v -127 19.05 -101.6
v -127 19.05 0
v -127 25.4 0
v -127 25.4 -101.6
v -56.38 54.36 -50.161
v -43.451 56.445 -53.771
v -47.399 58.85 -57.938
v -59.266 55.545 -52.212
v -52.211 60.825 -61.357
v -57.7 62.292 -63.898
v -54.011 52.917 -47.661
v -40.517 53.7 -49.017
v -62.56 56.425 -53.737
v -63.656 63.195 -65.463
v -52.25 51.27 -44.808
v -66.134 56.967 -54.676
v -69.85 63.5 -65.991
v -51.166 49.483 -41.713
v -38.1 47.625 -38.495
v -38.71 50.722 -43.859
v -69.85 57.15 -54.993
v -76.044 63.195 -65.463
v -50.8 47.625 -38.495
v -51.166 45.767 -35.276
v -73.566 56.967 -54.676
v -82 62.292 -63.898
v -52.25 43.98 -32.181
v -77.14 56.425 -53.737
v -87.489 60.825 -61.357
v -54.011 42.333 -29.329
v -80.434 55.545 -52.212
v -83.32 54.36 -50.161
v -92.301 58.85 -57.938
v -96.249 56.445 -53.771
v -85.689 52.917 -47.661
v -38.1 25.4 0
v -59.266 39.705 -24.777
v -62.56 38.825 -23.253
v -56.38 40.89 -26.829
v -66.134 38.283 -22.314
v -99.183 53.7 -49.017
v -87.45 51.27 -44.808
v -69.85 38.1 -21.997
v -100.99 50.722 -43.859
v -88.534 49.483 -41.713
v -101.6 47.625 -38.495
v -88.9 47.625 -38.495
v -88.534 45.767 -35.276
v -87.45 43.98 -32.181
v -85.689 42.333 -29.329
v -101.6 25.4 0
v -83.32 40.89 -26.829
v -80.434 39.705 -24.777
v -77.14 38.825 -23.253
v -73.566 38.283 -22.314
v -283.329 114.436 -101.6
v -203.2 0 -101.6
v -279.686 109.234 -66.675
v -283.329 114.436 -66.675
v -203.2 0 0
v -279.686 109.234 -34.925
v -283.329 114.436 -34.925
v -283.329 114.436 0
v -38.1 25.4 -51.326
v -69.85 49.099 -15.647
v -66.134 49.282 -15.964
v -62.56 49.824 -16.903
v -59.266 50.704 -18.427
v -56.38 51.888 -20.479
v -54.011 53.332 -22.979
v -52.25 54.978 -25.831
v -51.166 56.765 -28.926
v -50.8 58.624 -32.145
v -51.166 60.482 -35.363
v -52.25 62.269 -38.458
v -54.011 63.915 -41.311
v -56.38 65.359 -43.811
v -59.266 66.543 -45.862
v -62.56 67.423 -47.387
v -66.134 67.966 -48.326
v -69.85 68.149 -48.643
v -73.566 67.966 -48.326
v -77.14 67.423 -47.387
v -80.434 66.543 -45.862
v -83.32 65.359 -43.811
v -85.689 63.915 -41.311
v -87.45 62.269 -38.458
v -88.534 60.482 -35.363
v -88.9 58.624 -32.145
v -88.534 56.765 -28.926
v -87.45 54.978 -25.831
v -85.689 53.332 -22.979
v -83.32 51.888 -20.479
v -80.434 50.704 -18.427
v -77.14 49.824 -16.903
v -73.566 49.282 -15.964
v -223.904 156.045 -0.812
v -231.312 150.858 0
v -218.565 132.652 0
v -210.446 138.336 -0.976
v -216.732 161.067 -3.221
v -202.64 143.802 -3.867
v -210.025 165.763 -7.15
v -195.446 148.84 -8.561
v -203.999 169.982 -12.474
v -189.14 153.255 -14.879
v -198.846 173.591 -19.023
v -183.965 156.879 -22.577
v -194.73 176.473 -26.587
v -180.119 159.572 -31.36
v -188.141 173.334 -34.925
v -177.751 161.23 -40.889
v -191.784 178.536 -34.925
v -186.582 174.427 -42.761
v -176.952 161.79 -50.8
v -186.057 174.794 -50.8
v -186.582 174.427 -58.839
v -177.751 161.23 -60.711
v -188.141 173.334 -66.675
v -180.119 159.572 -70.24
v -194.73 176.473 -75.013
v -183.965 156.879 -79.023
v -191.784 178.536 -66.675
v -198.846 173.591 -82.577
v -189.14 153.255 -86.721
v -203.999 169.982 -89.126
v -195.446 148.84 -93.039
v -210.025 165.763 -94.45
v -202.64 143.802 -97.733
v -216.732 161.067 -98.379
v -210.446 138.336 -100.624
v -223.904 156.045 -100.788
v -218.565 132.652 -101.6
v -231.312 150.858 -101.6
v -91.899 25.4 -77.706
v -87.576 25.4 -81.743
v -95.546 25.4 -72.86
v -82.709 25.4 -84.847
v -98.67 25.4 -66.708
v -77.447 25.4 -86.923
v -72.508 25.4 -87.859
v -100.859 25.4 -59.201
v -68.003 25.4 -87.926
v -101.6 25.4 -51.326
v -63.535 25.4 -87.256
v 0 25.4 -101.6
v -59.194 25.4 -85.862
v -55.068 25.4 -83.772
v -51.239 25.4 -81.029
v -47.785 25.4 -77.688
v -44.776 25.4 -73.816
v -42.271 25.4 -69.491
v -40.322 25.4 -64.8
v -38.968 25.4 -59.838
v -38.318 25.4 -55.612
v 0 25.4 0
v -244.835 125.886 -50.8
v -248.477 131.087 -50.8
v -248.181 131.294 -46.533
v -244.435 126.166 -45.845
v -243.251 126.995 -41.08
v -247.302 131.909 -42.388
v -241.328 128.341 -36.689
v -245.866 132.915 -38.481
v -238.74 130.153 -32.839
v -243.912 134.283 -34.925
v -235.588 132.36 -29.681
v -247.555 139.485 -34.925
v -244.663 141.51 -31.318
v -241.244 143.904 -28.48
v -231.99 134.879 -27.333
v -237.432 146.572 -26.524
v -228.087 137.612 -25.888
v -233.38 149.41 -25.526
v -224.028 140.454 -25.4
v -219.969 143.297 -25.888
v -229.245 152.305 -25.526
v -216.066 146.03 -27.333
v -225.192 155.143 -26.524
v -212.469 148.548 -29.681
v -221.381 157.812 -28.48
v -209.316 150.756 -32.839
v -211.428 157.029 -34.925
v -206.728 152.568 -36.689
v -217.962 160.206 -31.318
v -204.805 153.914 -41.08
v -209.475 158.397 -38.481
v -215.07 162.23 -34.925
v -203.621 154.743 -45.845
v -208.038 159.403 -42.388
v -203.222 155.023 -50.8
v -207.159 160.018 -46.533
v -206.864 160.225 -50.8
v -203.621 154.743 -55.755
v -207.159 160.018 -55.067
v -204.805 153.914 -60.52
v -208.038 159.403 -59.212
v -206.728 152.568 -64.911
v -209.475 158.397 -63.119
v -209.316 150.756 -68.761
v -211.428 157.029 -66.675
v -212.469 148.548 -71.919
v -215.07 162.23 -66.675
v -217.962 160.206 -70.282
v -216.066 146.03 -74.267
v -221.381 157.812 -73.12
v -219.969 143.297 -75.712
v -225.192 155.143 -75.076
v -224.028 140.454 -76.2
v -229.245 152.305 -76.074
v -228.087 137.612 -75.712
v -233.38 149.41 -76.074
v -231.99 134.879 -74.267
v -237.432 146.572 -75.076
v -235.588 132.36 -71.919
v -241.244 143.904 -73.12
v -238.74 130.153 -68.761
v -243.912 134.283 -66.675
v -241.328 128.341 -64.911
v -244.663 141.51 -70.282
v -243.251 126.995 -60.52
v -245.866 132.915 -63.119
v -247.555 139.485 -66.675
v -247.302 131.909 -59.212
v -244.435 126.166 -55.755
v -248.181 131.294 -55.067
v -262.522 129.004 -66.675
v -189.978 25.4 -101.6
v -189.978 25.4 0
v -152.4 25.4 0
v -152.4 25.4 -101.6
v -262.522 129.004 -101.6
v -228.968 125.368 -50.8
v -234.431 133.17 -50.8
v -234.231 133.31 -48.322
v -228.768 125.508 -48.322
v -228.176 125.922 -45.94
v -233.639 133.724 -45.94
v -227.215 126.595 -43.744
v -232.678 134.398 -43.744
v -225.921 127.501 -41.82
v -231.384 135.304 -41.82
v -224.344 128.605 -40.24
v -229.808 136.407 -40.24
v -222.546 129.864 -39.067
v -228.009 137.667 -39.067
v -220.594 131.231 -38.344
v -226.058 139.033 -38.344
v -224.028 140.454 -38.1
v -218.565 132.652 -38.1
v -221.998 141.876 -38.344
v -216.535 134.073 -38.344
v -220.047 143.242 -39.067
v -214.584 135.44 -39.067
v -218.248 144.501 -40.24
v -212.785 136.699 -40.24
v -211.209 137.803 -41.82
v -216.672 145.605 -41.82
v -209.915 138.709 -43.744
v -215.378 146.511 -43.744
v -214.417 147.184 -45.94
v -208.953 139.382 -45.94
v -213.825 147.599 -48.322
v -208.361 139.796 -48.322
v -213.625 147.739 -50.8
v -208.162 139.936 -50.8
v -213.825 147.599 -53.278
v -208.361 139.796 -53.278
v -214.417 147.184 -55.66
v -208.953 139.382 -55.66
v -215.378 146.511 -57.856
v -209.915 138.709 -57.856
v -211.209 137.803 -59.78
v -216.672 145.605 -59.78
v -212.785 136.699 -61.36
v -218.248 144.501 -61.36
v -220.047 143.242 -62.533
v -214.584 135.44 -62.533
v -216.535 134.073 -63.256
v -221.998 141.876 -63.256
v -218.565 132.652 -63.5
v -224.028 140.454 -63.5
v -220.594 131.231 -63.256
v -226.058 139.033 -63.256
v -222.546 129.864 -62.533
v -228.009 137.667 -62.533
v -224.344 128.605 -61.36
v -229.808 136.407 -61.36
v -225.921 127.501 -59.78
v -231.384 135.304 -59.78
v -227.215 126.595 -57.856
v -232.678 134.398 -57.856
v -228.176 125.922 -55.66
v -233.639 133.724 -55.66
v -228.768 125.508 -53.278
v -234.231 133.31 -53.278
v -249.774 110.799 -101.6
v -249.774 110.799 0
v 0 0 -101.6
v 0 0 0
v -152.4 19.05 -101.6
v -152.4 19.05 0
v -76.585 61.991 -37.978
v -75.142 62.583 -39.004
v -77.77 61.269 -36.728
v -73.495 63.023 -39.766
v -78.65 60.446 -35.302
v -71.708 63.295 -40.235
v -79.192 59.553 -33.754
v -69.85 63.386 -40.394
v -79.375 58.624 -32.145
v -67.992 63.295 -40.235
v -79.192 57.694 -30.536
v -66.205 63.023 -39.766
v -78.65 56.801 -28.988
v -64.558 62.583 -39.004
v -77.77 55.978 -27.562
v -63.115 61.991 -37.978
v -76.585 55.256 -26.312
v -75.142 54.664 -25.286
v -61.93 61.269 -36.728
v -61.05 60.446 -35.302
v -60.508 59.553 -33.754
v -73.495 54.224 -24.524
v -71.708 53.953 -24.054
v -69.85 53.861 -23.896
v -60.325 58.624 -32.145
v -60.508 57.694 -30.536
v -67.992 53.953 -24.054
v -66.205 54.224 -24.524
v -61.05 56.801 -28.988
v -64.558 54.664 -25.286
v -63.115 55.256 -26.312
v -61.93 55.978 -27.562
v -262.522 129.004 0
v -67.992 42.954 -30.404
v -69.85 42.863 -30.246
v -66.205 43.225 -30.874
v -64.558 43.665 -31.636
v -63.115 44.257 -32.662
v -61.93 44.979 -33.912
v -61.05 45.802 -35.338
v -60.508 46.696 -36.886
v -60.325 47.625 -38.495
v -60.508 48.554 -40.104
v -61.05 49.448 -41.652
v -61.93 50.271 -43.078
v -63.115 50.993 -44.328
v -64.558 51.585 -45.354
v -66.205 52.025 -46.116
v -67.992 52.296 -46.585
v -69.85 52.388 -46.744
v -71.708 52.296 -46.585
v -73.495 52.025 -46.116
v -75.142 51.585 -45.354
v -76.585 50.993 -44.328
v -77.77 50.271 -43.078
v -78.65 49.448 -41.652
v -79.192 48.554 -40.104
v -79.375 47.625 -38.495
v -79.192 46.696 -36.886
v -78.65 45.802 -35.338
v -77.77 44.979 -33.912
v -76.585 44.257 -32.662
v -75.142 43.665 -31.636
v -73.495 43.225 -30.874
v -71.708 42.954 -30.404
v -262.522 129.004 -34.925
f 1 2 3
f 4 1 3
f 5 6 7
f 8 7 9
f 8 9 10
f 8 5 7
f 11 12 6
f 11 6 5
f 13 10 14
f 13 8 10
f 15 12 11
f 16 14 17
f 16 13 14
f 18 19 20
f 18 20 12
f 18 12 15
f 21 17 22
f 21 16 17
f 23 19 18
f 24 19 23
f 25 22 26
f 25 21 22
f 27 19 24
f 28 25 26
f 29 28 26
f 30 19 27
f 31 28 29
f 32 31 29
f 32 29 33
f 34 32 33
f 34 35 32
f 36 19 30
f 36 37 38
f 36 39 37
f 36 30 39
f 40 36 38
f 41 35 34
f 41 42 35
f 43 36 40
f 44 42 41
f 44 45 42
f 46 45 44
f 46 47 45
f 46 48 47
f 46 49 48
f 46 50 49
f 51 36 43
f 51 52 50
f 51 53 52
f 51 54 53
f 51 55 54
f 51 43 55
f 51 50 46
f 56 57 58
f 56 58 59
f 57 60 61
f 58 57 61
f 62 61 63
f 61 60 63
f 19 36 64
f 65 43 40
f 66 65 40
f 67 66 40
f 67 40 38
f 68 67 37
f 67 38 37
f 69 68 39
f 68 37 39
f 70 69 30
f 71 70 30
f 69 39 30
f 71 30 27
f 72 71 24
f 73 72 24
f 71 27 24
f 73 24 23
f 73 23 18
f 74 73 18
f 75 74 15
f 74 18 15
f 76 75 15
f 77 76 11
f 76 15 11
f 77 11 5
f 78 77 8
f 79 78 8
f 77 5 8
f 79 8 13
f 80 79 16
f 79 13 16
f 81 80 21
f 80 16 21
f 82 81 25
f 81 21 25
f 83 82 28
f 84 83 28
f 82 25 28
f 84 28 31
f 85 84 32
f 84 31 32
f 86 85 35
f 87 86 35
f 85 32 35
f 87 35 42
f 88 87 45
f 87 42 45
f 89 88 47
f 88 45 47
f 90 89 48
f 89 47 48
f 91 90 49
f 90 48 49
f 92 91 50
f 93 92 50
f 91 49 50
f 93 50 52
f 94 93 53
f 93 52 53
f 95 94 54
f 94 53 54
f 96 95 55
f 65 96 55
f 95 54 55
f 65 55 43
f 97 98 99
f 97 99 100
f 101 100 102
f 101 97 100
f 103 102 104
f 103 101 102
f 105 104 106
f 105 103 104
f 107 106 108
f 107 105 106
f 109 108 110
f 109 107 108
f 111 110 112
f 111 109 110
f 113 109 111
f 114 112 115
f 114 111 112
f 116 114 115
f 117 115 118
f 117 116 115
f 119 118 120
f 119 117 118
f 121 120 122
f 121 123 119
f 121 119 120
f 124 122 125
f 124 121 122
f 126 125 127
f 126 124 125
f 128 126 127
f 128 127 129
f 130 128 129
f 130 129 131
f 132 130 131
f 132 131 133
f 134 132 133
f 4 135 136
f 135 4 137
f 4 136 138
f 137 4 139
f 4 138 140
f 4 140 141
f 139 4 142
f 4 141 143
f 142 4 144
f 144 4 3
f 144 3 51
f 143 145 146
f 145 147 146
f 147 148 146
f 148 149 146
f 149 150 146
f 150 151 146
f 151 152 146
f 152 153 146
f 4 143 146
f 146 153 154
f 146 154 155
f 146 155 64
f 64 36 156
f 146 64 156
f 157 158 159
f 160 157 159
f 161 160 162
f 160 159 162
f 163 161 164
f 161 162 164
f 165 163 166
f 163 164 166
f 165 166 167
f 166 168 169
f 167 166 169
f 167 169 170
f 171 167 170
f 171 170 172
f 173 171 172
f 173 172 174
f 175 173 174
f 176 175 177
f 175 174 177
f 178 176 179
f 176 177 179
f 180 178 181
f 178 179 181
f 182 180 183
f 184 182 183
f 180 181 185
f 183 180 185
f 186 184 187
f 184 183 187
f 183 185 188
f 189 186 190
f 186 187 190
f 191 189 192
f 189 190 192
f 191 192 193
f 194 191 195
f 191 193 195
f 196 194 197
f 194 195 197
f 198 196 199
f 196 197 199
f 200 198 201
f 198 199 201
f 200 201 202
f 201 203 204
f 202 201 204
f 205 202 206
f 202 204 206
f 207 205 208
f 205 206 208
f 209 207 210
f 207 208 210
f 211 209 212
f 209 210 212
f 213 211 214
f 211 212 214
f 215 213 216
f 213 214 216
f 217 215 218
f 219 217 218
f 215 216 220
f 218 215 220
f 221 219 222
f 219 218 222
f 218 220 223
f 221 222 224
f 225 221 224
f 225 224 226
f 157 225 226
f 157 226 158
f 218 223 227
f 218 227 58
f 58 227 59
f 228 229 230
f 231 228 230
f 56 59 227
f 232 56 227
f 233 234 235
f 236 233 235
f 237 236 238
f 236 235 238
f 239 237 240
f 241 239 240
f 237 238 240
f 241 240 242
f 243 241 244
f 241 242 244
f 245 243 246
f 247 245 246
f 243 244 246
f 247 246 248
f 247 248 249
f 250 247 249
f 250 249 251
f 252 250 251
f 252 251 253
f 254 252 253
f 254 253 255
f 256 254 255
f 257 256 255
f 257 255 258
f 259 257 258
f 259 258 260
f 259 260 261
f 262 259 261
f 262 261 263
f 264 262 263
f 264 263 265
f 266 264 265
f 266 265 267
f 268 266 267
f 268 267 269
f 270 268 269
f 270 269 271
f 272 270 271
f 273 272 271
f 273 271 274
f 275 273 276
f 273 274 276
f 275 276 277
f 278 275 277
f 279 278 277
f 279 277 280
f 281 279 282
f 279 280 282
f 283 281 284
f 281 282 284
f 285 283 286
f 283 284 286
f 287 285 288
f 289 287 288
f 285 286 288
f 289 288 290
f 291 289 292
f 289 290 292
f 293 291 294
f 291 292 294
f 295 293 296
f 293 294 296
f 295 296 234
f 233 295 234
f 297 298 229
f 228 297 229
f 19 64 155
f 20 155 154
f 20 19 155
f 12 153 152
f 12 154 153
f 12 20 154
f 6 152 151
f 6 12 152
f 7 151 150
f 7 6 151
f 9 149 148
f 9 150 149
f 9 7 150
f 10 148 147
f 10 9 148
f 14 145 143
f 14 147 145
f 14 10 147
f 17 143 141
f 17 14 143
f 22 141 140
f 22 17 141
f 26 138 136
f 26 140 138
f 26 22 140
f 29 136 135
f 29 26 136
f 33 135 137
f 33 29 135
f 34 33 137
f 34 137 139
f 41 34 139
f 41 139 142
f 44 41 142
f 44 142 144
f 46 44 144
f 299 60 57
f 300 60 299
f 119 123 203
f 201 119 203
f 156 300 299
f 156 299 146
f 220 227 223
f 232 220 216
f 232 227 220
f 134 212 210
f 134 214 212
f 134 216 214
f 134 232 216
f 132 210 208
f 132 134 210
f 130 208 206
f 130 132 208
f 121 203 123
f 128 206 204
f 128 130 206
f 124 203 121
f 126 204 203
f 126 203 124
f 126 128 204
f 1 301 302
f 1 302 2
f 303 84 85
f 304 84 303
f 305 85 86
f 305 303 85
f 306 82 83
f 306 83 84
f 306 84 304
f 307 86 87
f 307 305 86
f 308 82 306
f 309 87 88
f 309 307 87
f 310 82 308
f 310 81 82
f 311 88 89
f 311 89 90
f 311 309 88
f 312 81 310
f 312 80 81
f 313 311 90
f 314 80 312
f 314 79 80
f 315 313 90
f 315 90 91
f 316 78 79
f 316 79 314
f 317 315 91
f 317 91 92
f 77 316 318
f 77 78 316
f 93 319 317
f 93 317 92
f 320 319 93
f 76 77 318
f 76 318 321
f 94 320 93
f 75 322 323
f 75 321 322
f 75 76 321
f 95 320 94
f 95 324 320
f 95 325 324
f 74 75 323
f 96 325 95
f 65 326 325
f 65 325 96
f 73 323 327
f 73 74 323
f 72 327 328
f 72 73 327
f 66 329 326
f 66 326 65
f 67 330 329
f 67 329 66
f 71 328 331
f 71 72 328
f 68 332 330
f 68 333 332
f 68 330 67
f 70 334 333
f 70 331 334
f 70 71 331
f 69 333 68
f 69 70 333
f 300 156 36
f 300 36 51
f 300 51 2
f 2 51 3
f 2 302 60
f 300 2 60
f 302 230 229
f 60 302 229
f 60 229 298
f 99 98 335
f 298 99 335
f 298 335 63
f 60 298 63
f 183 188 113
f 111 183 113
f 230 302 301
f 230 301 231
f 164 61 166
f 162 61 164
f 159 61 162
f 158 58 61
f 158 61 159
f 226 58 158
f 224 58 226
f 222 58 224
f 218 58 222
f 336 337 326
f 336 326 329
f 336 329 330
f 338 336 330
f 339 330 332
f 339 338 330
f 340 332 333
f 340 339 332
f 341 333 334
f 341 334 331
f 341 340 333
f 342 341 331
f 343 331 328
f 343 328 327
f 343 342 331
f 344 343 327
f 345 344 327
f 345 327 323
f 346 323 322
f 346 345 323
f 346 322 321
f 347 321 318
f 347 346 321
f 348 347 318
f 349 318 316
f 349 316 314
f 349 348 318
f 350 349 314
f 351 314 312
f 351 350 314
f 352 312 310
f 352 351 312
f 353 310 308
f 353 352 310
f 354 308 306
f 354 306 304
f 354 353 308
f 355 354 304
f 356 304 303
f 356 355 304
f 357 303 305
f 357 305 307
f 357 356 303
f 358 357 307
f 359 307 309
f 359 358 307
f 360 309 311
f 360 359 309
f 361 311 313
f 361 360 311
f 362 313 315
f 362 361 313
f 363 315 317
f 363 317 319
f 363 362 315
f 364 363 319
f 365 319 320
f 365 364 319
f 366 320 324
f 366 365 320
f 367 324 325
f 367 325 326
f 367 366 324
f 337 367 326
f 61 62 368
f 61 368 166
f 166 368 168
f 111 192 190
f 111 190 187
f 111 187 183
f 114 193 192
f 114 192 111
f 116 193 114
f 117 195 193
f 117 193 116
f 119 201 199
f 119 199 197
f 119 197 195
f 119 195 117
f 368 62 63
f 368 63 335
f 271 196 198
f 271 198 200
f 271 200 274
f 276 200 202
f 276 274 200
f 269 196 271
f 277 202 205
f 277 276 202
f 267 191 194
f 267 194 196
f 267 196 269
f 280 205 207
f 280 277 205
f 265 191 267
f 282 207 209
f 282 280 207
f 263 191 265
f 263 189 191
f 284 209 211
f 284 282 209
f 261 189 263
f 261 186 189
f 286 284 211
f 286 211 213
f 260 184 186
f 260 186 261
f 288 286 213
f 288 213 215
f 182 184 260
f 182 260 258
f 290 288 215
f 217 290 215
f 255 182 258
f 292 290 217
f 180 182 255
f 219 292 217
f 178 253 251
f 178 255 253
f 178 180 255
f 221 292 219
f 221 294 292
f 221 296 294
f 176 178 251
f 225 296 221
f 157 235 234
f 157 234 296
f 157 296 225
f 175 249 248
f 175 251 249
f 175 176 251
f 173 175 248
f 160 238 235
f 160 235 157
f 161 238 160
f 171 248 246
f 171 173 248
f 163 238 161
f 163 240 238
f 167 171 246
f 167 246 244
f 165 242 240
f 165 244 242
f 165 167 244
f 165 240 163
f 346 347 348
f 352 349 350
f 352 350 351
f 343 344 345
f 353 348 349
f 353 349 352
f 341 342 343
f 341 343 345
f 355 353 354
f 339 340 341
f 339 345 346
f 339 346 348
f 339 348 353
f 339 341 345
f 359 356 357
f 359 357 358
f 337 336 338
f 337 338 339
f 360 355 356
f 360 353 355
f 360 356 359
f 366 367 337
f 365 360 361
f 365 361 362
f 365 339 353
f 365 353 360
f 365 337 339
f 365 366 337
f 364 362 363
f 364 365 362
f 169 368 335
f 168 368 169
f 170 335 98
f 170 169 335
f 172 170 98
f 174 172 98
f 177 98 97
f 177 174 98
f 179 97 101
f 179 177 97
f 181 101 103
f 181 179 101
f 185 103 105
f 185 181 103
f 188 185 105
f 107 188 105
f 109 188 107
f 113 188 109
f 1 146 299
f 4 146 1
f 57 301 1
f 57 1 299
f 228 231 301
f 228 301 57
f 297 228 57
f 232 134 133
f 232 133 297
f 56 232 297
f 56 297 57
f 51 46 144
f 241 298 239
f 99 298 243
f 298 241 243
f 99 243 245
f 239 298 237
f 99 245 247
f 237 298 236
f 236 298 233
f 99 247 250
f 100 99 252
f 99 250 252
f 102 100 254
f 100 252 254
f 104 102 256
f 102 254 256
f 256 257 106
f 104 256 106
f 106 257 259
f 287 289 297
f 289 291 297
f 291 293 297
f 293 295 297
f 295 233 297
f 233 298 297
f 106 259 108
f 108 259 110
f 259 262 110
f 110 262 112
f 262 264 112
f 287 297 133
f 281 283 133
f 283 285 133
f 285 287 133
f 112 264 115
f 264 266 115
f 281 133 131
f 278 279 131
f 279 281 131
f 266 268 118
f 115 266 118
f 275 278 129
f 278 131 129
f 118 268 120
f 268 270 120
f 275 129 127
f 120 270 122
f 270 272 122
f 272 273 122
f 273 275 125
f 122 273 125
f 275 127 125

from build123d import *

# Parameters (mm, degrees)
SKETCH1_W           = 203.2
SKETCH1_H           = 25.4
BOSS_EXTRUDE1_DEPTH = 101.6
SKETCH2_W           = 25.4
SKETCH2_H           = 6.35
CUT_EXTRUDE1_DEPTH  = 229.6
BOSS_EXTRUDE2_REACH = 235.091
SKETCH4_R           = 19.05
SKETCH4_R_2         = 9.525
BOSS_EXTRUDE3_DEPTH = 12.7
BOSS_EXTRUDE4_DEPTH = 101.6
BOSS_EXTRUDE5_DEPTH = 22.225
SKETCH7_R           = 25.4
SKETCH7_R_2         = 12.7
CUT_EXTRUDE4_DEPTH  = 12.7
CUT_EXTRUDE5_REACH  = 277.657
SKETCH8_R           = 12.7
CUT_EXTRUDE6_DEPTH  = 6.35


with BuildPart() as part:
    # Sketch1 → Boss-Extrude1 (new body)
    with BuildSketch(Plane.XY):
        with Locations((-101.6, 12.7)):
            Rectangle(SKETCH1_W, SKETCH1_H)
    extrude(amount=-BOSS_EXTRUDE1_DEPTH)

    # Sketch2 → Cut-Extrude1 (cut, through all)
    with BuildSketch(Plane.XY):
        with Locations((-139.7, 22.225)):
            Rectangle(SKETCH2_W, SKETCH2_H)
    extrude(amount=-CUT_EXTRUDE1_DEPTH, mode=Mode.SUBTRACT)

    # Sketch3 → Boss-Extrude2 (add, up to next)
    with BuildSketch(Plane(origin=(0, 19.05, 10.998522628), x_dir=(-1, 0, 0), z_dir=(0, 0.866025403784438, 0.500000000000001)), mode=Mode.PRIVATE) as boss_extrude2_sk1:
        with BuildLine():
            Line((101.6, -12.7), (38.1, -12.7))
            Line((38.1, -12.7), (38.1, -57.15))
            ThreePointArc((38.1, -57.15), (69.85, -88.9), (101.6, -57.15))
            Line((101.6, -57.15), (101.6, -12.7))
        make_face()
    boss_extrude2_tool1 = extrude(boss_extrude2_sk1.sketch, amount=-BOSS_EXTRUDE2_REACH, mode=Mode.PRIVATE) - part.part
    add(boss_extrude2_tool1.solids().sort_by_distance((-69.85, 42.927534, -30.35858))[0])

    # Sketch4 → Boss-Extrude3 (add)
    with BuildSketch(Plane(origin=(0, 19.05, 10.998522628), x_dir=(1, 0, 0), z_dir=(0, 0.8660254037844382, 0.5000000000000011))):
        with Locations((-69.85, 57.15)):
            Circle(SKETCH4_R)
        with Locations((-69.85, 57.15)):
            Circle(SKETCH4_R_2, mode=Mode.SUBTRACT)
    extrude(amount=BOSS_EXTRUDE3_DEPTH)

    # Sketch5 → Boss-Extrude4 (add)
    with BuildSketch(Plane.XY):
        Polygon((-203.2, 0), (-283.328628158, 114.435540587), (-262.522166233, 129.00438207), (-182.393538075, 14.568841483), align=None)
    extrude(amount=-BOSS_EXTRUDE4_DEPTH)

    # Sketch6 → Boss-Extrude5 (add)
    with BuildSketch(Plane(origin=(-146.979381596, 209.908310859, 0), x_dir=(0.8191520442889892, 0.5735764363510499, 0), z_dir=(-0.5735764363510498, 0.8191520442889891, 0))):
        with BuildLine():
            Line((-166.4516954, 0), (-102.9516954, 0))
            ThreePointArc((-102.9516954, 0), (-52.1516954, 50.8), (-102.9516954, 101.6))
            Line((-102.9516954, 101.6), (-166.4516954, 101.6))
            Line((-166.4516954, 101.6), (-166.4516954, 0))
        make_face()
    extrude(amount=-BOSS_EXTRUDE5_DEPTH)

    # Sketch7 → Cut-Extrude4 (cut)
    with BuildSketch(Plane(origin=(-146.979381596, 209.908310859, 0), x_dir=(0.8191520442889892, 0.5735764363510499, 0), z_dir=(-0.5735764363510498, 0.8191520442889891, 0))):
        with Locations((-102.9516954, 50.8)):
            Circle(SKETCH7_R)
        with Locations((-102.9516954, 50.8)):
            Circle(SKETCH7_R_2, mode=Mode.SUBTRACT)
    extrude(amount=-CUT_EXTRUDE4_DEPTH, mode=Mode.SUBTRACT)

    # Sketch8 → Cut-Extrude5 (cut, up to next)
    with BuildSketch(Plane(origin=(-146.979381596, 209.908310859, 0), x_dir=(0.8191520442889892, 0.5735764363510499, 0), z_dir=(-0.5735764363510498, 0.8191520442889891, 0)), mode=Mode.PRIVATE) as cut_extrude5_sk1:
        with Locations((-102.9516954, 50.8)):
            Circle(SKETCH8_R)
    cut_extrude5_tool1 = extrude(cut_extrude5_sk1.sketch, amount=-CUT_EXTRUDE5_REACH, mode=Mode.PRIVATE) & part.part
    add(cut_extrude5_tool1.solids().sort_by_distance((-231.312473, 150.857644, -50.8))[0], mode=Mode.SUBTRACT)

    # Sketch9 → Cut-Extrude6 (cut)
    with BuildSketch(Plane(origin=(-146.979381596, 209.908310859, 0), x_dir=(0.8191520442889892, 0.5735764363510499, 0), z_dir=(-0.5735764363510498, 0.8191520442889891, 0))):
        with BuildLine():
            ThreePointArc((-54.695873212, 34.925), (-52.1516954, 50.8), (-54.695873212, 66.675))
            Line((-54.695873212, 66.675), (-83.123826755, 66.675))
            ThreePointArc((-83.123826755, 66.675), (-77.5516954, 50.8), (-83.123826755, 34.925))
            Line((-83.123826755, 34.925), (-54.695873212, 34.925))
        make_face()
        with BuildLine():
            ThreePointArc((-122.779564044, 34.925), (-128.3516954, 50.8), (-122.779564044, 66.675))
            Line((-122.779564044, 66.675), (-166.4516954, 66.675))
            Line((-166.4516954, 66.675), (-166.4516954, 34.925))
            Line((-166.4516954, 34.925), (-122.779564044, 34.925))
        make_face()
    extrude(amount=-CUT_EXTRUDE6_DEPTH, mode=Mode.SUBTRACT)


solid = part.part
